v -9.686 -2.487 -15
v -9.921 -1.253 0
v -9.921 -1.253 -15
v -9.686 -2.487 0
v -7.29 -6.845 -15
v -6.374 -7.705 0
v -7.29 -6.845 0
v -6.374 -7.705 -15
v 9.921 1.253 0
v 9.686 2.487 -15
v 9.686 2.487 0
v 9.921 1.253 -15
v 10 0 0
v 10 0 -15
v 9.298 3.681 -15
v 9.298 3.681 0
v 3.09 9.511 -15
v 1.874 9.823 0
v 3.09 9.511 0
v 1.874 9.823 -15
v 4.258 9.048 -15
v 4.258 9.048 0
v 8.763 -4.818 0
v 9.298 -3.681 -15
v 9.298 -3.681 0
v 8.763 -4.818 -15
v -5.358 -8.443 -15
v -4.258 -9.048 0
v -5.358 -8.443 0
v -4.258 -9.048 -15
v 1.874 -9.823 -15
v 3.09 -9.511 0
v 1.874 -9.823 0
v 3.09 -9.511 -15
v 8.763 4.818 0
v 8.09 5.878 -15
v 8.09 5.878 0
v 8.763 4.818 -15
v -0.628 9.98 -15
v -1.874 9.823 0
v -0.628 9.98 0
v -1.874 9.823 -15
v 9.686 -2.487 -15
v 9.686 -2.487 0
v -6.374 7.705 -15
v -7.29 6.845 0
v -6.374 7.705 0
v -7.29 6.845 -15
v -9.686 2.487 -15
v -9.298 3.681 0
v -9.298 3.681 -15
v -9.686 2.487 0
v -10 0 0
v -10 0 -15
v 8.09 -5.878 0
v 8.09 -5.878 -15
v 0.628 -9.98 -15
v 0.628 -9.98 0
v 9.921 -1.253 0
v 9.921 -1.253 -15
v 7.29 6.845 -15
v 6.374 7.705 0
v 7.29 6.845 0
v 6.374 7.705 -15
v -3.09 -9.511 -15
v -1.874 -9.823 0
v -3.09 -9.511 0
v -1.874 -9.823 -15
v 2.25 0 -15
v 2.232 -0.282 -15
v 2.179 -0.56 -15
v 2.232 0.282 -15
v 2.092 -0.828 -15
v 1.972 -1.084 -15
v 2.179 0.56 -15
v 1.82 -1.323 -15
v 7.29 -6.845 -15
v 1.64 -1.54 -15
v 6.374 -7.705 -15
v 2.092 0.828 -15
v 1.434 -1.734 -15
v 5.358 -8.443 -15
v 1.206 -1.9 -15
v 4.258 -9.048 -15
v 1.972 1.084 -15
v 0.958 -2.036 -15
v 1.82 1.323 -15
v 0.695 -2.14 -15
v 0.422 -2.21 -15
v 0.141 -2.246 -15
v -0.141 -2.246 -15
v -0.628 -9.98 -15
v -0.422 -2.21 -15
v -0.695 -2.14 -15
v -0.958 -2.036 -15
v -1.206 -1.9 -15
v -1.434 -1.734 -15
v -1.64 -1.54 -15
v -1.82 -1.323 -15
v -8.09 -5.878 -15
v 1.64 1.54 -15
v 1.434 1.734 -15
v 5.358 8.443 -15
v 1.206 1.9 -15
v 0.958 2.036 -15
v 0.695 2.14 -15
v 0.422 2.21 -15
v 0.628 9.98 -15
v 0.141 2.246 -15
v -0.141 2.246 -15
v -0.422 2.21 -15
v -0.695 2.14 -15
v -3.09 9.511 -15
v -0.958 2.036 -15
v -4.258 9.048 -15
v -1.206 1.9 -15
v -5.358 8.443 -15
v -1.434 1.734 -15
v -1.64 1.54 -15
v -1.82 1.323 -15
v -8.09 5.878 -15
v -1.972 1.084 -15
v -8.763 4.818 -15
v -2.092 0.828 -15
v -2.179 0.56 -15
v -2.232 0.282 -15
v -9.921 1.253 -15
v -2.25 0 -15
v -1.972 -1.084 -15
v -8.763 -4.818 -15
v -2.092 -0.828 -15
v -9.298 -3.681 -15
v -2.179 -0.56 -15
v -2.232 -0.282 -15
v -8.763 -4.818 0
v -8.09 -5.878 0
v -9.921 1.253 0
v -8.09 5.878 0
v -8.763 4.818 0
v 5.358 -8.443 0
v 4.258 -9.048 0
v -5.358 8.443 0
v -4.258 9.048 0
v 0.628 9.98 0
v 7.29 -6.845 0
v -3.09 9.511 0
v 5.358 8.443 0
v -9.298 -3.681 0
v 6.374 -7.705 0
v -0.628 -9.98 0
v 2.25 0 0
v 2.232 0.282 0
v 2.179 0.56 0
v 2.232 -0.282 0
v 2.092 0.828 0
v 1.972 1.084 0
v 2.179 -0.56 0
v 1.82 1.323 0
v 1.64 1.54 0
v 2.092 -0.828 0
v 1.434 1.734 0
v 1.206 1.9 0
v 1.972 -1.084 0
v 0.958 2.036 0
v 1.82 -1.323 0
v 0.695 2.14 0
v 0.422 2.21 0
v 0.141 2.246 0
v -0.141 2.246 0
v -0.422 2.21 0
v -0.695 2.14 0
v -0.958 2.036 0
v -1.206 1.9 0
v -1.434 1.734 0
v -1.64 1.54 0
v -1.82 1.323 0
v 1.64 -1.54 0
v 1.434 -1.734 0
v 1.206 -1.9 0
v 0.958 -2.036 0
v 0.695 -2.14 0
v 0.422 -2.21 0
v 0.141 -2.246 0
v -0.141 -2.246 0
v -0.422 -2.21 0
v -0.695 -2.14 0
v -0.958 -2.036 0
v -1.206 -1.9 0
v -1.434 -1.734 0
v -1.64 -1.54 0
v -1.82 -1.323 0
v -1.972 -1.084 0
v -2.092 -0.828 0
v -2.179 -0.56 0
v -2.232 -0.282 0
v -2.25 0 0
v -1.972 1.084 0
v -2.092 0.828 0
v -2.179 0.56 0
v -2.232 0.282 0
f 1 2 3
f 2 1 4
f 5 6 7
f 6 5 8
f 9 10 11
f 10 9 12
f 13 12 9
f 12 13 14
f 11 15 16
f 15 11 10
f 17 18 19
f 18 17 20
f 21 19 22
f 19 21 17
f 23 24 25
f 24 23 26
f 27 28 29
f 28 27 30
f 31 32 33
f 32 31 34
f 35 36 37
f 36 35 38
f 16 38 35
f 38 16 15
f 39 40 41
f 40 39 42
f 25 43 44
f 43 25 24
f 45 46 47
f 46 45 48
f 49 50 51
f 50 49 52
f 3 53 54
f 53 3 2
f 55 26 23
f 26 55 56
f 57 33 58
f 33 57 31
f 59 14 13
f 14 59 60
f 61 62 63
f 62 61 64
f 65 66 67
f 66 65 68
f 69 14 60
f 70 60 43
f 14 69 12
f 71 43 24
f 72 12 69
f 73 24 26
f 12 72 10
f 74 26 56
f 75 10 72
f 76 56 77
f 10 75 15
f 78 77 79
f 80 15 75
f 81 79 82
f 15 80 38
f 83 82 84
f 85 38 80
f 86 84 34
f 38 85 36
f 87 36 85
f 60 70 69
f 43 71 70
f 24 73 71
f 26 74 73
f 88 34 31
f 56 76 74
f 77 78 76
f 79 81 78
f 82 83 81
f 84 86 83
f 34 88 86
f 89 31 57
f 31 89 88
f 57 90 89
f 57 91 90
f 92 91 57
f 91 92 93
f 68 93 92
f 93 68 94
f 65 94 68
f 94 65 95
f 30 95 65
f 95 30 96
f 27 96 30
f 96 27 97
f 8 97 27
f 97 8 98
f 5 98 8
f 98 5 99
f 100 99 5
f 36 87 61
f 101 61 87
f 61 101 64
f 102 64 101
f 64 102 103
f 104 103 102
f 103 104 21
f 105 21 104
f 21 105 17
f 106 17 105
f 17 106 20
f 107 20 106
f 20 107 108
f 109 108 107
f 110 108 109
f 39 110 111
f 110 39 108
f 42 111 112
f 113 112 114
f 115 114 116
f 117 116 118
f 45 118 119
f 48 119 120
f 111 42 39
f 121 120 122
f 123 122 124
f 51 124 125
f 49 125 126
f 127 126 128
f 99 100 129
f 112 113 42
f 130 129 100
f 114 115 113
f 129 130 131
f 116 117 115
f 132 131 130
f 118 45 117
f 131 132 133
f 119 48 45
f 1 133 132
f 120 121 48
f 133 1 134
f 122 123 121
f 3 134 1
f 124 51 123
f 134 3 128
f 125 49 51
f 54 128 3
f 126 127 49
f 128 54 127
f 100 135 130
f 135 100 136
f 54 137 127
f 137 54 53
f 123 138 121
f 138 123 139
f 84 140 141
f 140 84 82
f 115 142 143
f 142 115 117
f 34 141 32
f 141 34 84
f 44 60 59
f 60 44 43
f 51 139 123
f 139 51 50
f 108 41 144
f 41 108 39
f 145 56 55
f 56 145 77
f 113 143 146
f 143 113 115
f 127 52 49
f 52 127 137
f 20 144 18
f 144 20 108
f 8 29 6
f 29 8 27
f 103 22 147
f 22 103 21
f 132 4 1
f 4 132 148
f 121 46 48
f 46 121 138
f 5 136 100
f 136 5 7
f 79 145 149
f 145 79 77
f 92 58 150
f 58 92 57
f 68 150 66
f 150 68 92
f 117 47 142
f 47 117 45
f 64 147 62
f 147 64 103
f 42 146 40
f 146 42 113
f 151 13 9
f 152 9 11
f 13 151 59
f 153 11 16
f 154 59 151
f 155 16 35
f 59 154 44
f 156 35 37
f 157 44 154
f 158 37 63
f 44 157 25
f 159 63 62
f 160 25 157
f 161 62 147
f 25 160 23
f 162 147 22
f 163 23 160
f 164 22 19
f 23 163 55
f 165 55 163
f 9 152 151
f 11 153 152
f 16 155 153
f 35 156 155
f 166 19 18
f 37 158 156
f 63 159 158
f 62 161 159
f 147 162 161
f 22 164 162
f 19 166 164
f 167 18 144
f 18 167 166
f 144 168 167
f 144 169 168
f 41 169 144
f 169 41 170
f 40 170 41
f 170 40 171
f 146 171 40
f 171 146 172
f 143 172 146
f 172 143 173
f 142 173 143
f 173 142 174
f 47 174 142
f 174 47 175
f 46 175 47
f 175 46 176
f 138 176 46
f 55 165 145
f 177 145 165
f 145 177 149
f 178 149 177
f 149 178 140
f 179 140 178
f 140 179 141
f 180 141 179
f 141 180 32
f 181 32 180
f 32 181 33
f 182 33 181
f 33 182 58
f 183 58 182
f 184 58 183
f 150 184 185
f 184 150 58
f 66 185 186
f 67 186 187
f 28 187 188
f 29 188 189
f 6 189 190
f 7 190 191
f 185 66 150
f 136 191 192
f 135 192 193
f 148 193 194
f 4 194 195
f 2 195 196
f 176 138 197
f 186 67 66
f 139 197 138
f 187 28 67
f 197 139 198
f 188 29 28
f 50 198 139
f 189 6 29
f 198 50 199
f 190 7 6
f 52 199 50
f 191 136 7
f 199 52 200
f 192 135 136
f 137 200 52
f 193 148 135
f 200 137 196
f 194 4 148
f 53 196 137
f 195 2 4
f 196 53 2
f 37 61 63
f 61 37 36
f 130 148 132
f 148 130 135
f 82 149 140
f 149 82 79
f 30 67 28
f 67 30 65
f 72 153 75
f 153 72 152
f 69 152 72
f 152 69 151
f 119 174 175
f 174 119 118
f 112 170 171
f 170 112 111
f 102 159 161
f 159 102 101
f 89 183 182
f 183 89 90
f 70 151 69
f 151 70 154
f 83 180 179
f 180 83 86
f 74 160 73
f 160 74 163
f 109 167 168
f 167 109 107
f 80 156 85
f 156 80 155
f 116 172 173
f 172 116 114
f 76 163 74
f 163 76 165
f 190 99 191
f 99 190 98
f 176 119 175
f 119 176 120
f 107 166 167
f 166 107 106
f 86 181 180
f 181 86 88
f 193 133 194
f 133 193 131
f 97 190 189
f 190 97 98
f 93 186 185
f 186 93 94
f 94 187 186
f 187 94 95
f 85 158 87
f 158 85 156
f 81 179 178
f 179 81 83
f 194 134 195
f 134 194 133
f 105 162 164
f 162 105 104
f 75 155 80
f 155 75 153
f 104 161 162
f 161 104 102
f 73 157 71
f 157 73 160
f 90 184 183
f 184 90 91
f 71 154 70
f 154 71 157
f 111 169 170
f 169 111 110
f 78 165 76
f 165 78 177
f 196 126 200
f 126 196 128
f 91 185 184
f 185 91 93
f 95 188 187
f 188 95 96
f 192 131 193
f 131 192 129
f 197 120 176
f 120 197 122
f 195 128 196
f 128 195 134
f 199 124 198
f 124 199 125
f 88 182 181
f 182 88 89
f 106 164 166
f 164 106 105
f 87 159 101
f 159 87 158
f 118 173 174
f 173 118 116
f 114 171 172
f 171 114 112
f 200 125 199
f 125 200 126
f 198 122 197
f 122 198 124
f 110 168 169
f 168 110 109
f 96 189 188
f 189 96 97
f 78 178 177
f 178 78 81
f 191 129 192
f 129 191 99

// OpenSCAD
$fn = 50;


difference() {
	union() {
		translate(v = [0, 0, -15.0000000000]) {
			cylinder(h = 15, r = 10.0000000000);
		}
		cylinder(h = 0, r = 20.0000000000);
	}
	union() {
		#translate(v = [0, 0, -15]) {
			cylinder(h = 15, r = 2.2500000000);
		}
	}
}
